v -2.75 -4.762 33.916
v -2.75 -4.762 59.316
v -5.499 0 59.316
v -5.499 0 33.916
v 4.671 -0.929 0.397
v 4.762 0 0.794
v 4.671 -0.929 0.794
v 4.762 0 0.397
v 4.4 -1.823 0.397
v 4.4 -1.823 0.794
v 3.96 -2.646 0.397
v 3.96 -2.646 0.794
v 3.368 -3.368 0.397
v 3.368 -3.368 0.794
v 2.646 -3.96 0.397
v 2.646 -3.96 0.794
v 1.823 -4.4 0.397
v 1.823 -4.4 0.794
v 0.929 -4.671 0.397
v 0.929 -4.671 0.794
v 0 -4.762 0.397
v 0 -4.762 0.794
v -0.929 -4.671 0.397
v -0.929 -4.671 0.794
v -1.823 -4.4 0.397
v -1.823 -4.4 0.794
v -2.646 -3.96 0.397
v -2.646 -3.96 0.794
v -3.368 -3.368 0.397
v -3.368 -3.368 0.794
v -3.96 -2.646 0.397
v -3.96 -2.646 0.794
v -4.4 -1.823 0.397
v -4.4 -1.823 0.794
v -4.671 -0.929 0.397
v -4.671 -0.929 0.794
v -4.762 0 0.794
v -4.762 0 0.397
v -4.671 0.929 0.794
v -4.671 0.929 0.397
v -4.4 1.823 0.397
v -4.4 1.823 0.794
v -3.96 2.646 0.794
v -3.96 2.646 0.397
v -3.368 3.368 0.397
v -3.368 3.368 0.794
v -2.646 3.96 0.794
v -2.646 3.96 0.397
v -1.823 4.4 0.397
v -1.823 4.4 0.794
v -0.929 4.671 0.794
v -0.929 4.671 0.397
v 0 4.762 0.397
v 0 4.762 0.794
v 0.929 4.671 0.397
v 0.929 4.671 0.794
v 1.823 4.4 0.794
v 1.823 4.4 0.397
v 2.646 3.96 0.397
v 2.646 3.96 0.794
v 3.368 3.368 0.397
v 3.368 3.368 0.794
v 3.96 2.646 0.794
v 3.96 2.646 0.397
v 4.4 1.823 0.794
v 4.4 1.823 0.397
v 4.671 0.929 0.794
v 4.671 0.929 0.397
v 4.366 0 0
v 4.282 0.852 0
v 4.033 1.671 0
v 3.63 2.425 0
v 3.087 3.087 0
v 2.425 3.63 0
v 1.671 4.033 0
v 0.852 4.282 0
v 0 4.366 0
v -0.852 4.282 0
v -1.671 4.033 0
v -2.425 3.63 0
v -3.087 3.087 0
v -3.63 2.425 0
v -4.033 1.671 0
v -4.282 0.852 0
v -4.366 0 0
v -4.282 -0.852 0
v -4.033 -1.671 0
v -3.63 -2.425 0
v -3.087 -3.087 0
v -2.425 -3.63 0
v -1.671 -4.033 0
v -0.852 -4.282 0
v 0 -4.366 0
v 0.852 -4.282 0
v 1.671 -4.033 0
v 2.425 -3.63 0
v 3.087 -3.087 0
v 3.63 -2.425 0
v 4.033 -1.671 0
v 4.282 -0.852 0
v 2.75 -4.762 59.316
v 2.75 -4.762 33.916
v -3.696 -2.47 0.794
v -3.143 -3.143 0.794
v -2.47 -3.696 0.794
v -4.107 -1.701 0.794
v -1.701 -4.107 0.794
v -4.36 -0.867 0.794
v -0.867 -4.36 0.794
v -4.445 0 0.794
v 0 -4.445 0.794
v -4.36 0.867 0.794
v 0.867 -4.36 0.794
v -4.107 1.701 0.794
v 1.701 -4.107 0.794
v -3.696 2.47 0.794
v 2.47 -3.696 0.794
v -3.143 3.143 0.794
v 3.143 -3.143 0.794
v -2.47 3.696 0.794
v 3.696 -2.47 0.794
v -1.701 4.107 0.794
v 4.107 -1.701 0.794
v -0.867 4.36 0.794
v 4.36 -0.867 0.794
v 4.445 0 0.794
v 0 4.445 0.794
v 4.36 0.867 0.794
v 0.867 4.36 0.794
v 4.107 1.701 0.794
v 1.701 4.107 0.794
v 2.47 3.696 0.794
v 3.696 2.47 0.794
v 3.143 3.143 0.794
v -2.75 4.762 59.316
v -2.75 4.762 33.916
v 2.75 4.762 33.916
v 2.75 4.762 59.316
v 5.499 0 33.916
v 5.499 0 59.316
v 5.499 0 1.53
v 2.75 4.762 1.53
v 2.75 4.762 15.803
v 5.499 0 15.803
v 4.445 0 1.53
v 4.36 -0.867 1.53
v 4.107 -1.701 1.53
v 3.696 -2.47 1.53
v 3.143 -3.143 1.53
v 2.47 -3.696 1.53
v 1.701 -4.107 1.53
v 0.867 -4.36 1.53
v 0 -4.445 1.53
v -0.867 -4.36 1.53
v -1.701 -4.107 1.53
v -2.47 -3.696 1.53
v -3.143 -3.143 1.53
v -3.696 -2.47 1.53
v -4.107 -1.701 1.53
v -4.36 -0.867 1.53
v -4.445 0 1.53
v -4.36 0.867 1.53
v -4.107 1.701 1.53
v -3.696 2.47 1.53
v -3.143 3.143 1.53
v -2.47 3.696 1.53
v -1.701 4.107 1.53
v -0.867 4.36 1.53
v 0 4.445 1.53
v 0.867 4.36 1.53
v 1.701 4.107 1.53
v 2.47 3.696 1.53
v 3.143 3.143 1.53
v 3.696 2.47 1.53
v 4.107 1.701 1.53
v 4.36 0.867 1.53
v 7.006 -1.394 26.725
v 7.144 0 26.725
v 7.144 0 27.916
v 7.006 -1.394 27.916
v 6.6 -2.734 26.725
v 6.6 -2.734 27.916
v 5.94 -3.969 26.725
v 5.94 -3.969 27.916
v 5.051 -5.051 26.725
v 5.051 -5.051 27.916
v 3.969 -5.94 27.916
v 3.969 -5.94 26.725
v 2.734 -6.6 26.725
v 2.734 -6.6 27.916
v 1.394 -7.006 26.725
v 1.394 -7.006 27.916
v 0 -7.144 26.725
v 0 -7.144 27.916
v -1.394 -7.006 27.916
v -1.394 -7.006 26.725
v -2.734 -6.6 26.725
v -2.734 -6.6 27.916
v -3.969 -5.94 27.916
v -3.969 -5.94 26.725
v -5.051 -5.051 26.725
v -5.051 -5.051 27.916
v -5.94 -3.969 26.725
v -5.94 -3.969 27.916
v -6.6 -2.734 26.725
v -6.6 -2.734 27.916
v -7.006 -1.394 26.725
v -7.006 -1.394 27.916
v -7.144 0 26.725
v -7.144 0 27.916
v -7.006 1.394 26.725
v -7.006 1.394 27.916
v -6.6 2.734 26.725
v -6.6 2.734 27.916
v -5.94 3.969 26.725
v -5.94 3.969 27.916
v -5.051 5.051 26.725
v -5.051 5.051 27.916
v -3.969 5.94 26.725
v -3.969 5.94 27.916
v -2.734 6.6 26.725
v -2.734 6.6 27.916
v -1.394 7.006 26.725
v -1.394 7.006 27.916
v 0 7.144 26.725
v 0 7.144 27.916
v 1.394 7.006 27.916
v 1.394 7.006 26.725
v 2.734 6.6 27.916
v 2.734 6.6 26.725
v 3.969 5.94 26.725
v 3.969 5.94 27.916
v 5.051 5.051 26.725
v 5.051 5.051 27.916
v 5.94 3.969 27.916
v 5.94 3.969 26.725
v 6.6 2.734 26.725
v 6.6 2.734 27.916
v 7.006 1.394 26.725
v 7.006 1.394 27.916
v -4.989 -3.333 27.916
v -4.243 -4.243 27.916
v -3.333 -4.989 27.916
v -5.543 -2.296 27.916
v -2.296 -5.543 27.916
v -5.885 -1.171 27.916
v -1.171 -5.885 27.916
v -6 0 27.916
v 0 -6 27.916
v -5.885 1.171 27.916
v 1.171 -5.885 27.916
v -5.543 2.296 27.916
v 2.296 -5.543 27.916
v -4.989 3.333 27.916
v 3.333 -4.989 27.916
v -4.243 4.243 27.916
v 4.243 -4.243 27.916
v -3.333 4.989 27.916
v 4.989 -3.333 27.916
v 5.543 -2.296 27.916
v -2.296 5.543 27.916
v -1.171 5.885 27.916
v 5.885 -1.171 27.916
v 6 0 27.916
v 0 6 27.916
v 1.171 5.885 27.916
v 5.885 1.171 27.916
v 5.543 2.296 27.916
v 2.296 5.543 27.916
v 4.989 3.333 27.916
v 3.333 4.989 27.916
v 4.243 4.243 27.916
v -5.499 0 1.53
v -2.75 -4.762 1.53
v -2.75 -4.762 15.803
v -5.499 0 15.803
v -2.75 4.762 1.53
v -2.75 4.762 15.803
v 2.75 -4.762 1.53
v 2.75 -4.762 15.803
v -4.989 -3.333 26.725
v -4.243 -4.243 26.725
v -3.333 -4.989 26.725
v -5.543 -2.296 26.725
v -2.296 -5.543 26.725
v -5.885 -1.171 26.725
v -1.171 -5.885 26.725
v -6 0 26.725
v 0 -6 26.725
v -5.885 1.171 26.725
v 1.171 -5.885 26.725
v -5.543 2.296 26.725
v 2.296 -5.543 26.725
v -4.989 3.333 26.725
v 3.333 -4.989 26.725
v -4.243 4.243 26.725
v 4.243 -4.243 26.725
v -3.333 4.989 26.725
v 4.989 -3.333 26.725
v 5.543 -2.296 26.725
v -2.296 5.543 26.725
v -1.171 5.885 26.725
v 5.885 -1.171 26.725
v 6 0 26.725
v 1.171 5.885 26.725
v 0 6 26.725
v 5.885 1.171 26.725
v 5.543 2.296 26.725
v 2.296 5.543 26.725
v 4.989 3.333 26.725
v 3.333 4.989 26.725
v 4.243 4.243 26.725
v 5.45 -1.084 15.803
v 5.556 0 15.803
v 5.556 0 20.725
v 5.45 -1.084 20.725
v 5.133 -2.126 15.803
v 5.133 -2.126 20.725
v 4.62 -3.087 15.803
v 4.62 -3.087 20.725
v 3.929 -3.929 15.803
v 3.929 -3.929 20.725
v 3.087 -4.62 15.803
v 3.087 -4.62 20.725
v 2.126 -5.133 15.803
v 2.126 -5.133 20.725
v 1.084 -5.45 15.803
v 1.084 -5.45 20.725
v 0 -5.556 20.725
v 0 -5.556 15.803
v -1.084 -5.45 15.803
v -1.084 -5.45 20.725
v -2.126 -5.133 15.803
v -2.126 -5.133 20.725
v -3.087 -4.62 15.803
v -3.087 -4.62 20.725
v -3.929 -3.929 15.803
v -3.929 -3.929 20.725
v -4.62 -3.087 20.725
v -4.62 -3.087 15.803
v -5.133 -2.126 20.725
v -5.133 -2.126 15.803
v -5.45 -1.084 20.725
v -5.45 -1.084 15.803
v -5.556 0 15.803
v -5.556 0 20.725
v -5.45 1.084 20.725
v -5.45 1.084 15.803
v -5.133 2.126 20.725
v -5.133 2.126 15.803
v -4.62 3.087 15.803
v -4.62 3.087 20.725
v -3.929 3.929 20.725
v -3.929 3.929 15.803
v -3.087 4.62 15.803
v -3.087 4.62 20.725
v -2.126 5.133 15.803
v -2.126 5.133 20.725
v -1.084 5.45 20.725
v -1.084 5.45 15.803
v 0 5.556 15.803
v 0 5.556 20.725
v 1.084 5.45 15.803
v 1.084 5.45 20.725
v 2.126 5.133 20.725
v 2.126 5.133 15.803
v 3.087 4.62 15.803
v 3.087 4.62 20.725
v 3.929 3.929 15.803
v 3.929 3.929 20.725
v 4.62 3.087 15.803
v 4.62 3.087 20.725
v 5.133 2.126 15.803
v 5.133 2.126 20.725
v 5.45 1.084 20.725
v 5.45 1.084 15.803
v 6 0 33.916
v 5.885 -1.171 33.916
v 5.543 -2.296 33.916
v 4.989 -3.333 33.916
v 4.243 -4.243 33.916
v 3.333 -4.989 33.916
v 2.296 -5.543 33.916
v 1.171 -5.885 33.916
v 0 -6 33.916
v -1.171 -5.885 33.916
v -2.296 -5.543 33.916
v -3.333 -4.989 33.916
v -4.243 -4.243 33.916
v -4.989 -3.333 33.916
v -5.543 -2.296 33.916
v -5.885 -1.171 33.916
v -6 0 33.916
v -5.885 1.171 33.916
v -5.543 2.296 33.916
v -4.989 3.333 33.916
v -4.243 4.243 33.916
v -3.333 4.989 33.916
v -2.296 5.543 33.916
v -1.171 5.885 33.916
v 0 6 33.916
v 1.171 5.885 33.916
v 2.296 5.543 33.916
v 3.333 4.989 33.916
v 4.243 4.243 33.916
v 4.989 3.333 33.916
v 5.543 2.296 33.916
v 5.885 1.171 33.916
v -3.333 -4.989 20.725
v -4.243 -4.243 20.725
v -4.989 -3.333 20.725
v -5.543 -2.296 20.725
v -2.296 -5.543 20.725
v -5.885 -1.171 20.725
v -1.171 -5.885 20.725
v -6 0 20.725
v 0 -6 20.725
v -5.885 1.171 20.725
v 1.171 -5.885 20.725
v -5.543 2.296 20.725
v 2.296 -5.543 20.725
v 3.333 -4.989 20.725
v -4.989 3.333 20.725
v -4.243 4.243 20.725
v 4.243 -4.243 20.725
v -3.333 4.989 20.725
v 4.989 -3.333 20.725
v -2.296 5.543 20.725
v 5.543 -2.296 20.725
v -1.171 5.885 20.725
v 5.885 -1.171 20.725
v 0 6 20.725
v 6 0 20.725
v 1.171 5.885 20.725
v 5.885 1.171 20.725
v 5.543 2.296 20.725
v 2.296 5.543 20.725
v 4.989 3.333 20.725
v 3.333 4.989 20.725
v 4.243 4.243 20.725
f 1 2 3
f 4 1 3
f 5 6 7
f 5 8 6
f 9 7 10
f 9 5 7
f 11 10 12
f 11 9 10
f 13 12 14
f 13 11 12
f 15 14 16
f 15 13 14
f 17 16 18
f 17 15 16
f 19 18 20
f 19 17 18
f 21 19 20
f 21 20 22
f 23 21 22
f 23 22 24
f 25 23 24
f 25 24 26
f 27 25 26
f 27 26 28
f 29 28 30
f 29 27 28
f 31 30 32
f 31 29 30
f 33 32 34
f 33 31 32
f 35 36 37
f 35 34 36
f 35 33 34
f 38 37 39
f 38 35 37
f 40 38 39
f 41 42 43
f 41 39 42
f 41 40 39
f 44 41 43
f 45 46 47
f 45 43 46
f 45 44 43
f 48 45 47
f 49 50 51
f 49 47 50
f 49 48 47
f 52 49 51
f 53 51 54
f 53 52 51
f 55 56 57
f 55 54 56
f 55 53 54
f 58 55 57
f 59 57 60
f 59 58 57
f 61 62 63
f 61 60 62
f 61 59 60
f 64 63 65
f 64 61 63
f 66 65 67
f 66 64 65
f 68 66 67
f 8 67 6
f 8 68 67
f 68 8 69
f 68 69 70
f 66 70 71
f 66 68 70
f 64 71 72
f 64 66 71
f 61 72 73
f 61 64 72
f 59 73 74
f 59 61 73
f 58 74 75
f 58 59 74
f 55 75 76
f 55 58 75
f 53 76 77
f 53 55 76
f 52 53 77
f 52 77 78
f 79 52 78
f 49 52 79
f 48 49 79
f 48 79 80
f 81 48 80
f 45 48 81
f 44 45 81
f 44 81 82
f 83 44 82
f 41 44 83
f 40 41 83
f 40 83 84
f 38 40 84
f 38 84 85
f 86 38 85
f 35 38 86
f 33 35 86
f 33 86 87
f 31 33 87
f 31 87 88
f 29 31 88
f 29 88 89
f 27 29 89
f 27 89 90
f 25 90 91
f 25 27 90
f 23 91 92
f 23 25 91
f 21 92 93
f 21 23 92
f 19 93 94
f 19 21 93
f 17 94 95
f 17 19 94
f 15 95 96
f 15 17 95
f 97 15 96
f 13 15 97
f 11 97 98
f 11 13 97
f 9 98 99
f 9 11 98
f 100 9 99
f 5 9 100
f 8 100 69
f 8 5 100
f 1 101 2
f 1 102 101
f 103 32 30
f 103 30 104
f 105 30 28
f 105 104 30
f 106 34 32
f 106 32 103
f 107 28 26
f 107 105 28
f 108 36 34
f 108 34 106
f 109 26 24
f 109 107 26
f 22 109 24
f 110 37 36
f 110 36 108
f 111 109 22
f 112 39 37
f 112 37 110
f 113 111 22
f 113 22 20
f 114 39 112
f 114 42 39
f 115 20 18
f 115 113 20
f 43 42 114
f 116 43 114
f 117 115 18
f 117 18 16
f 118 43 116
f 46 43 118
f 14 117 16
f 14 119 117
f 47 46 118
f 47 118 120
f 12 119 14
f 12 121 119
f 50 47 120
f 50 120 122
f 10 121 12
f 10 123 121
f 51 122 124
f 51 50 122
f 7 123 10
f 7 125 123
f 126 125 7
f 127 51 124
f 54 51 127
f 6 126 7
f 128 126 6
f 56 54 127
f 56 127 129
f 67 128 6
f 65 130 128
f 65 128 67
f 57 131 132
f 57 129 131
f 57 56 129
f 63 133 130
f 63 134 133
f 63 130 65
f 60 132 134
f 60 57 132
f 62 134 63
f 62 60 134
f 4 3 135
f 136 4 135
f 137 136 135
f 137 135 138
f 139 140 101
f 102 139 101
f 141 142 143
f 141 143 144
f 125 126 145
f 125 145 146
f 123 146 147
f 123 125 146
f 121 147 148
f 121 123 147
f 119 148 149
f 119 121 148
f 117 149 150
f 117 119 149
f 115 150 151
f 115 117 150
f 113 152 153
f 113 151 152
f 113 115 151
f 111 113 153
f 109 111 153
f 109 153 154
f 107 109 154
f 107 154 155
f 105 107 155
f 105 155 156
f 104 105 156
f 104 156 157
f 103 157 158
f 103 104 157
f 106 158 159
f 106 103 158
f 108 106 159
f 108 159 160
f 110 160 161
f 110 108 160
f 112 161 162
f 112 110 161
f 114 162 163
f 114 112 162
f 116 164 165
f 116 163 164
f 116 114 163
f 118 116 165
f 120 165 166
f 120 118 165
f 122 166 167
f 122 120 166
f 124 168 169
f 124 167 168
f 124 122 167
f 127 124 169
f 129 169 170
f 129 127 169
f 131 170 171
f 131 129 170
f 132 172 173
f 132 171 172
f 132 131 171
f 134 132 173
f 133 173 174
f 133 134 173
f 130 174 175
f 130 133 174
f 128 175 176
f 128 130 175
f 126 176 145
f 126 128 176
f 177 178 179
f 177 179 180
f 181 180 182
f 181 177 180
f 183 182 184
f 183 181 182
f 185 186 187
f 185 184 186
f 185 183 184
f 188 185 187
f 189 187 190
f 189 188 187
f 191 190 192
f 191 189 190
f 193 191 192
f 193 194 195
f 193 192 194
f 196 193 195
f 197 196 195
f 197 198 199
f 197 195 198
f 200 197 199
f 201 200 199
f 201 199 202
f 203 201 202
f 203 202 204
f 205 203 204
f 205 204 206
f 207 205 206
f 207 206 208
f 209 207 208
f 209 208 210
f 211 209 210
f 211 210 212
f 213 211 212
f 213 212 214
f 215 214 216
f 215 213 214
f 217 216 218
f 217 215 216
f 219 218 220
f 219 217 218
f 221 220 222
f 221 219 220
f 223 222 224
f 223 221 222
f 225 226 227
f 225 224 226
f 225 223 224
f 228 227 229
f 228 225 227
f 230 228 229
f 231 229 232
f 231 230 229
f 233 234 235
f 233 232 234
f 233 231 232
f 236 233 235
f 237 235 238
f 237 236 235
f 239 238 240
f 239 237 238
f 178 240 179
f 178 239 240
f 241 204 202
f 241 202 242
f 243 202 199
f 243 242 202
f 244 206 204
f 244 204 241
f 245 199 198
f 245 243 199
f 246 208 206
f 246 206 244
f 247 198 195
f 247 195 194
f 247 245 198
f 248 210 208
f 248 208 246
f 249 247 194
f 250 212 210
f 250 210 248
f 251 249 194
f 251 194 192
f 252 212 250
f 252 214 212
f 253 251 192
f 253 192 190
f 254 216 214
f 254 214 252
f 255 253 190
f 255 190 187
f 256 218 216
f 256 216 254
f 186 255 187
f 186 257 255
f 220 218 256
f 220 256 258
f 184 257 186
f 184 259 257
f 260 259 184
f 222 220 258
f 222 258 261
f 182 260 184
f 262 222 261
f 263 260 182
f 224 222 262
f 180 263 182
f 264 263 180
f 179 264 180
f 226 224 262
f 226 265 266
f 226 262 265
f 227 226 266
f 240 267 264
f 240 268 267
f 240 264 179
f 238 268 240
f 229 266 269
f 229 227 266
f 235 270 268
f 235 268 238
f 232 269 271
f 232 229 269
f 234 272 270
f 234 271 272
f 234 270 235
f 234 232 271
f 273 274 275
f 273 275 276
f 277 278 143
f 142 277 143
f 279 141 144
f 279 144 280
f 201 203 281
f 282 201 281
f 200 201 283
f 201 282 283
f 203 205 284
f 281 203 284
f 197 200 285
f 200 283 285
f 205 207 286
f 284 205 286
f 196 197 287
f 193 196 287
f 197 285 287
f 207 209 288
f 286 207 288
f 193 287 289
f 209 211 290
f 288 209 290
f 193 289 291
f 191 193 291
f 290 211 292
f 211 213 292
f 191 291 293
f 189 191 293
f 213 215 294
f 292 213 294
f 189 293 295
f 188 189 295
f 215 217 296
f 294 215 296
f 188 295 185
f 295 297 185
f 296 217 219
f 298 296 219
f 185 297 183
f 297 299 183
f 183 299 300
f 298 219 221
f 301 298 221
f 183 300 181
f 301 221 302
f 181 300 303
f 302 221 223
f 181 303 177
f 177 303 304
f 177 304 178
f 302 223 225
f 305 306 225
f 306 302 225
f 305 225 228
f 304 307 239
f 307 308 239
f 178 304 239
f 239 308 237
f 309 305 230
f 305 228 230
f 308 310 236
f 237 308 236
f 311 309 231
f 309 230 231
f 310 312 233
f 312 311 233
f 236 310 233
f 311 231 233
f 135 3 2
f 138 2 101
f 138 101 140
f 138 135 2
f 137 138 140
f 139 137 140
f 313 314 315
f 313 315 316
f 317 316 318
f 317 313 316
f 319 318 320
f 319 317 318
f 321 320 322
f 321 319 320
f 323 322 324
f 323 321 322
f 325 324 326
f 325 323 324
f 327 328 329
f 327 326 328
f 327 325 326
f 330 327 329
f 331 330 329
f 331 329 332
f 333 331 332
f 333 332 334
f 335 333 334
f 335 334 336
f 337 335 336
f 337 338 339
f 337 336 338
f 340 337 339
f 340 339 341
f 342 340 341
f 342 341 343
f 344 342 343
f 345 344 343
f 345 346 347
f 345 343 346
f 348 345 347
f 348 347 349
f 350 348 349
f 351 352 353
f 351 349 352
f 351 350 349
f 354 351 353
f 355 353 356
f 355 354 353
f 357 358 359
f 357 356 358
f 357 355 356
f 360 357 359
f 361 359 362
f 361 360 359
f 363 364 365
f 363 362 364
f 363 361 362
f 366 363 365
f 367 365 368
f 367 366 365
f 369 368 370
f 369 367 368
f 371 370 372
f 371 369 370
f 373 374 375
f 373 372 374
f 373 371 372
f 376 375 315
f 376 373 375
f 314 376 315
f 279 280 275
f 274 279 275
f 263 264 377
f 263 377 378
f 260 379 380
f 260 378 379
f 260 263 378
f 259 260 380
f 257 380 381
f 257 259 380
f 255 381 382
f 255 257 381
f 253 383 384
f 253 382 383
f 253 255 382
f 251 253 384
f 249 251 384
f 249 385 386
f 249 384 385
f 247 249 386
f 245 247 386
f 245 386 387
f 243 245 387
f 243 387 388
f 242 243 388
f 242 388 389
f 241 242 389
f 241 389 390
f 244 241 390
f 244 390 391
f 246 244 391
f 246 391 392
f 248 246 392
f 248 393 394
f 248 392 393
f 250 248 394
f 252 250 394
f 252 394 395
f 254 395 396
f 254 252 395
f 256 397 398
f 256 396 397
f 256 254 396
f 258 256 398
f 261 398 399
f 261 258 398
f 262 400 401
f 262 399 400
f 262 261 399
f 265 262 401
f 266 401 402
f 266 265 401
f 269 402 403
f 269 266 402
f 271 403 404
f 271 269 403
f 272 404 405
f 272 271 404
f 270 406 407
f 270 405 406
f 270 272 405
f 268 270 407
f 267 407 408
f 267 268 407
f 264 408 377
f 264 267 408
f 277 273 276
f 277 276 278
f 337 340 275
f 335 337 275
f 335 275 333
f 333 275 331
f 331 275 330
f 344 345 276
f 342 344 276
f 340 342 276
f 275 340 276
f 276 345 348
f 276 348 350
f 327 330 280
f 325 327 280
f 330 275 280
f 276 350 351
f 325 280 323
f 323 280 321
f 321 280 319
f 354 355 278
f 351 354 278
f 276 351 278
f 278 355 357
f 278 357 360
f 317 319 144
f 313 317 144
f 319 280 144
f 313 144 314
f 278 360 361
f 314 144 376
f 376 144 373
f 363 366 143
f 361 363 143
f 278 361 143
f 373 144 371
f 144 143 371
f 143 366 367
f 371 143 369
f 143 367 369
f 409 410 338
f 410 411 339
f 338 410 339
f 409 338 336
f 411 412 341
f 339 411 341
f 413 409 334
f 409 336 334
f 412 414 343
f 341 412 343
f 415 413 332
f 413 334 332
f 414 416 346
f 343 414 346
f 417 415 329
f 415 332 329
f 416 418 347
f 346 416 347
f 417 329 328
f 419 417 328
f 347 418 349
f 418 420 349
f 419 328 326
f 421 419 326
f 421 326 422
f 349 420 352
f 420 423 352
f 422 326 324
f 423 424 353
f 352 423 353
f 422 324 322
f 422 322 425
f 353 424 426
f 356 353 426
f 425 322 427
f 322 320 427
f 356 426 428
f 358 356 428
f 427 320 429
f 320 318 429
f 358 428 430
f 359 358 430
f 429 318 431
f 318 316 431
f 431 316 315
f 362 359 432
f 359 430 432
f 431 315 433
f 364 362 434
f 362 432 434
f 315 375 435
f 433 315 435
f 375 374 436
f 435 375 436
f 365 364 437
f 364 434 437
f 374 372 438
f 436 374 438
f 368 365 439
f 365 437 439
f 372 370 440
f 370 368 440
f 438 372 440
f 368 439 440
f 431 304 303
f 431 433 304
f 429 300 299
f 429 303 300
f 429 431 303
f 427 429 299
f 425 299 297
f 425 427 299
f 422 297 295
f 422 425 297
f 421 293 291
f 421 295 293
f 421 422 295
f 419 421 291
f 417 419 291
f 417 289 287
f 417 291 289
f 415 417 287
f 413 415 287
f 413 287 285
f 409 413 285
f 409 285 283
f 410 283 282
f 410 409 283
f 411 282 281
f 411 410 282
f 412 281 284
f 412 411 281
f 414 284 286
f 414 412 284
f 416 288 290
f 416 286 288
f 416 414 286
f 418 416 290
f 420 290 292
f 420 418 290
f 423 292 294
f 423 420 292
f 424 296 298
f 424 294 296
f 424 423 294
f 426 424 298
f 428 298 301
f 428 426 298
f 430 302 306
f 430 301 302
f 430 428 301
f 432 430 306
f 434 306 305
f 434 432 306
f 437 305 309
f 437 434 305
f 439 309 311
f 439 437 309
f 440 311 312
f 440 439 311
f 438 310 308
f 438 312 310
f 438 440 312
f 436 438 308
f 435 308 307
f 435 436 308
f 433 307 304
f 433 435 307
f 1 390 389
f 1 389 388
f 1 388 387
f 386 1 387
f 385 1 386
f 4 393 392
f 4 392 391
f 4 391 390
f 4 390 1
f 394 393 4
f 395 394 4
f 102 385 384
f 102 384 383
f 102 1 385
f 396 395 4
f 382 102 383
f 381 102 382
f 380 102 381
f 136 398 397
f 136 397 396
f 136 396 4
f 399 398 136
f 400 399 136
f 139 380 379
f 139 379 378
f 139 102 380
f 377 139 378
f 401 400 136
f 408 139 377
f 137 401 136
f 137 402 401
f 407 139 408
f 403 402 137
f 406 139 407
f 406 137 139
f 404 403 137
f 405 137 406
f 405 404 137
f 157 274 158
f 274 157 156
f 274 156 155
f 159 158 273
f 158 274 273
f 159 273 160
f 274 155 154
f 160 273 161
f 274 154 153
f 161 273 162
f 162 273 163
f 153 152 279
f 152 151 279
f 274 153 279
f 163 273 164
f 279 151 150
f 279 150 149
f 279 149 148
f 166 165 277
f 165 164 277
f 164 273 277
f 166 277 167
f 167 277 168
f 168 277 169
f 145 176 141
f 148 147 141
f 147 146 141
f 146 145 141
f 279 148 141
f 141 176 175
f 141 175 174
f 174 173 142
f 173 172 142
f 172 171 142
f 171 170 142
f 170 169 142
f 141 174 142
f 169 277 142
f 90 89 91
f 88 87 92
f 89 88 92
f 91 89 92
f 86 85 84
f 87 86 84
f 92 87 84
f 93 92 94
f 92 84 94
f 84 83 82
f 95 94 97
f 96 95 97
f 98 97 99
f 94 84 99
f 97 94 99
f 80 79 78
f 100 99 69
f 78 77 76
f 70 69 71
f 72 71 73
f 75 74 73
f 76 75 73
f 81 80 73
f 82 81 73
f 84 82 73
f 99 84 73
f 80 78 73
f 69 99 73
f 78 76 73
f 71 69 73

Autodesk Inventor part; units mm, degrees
ref_plane "YZ Plane" through (0, 0, 0) normal (1, 0, 0) x (0, 1, 0)
ref_plane "XZ Plane" through (0, 0, 0) normal (0, 1, 0) x (-1, 0, 0)
ref_plane "XY Plane" through (0, 0, 0) normal (0, 0, 1) x (1, 0, 0)
sketch "Sketch1" plane through (0, 0, 0) normal (0, 0, 1) x (1, 0, 0)
  circle A0 centre (0, 0) radius 4.7625
  dimension "d0" = 9.525
extrude "Extrusion1" add sketch "Sketch1" along normal blind 0.7937
sketch "Sketch2" plane through (0, 0, 0.7937) normal (0, 0, 1) x (1, 0, 0)
  circle A0 centre (0, 0) radius 4.7625 projected
  circle A1 centre (0, 0) radius 4.445
  dimension "d3" = 8.89
extrude "Extrusion2" add sketch "Sketch2" along normal blind 0.7366 contours A1
sketch "Sketch3" plane through (0, 0, 1.5304) normal (0, 0, 1) x (1, 0, 0)
  circle A0 centre (0, 0) radius 4.445 projected
  line L0 (5.4993, 0) -> (2.7496, -4.7625)
  line L1 (2.7496, -4.7625) -> (-2.7496, -4.7625)
  line L2 (-2.7496, -4.7625) -> (-5.4993, 0)
  line L3 (-5.4993, 0) -> (-2.7496, 4.7625)
  line L4 (-2.7496, 4.7625) -> (2.7496, 4.7625)
  line L5 (2.7496, 4.7625) -> (5.4993, 0)
  dimension "d6" = 9.525
extrude "Extrusion3" add sketch "Sketch3" along normal blind 14.273 contours A0 | L0 L1 L2 L3 L4 L5
sketch "Sketch4" plane through (0, 0, 15.8034) normal (0, 0, 1) x (1, 0, 0)
  circle A0 centre (0, 0) radius 5.5563
  dimension "d9" = 11.1125
extrude "Extrusion4" add sketch "Sketch4" along normal blind 4.9219
sketch "Sketch8" plane through (0, 0, 20.7252) normal (0, 0, 1) x (1, 0, 0)
  circle A0 centre (0, 0) radius 5.5562 projected
  circle A1 centre (0, 0) radius 6
  dimension "d24" = 12
extrude "Extrusion8" add sketch "Sketch8" along normal blind 6 contours A0 | A1
sketch "Sketch5" plane through (0, 0, 26.7252) normal (0, 0, 1) x (1, 0, 0)
  circle A0 centre (0, 0) radius 7.1437
  dimension "d12" = 14.2875
extrude "Extrusion5" add sketch "Sketch5" along normal blind 1.1906
sketch "Sketch6" plane through (0, 0, 27.9159) normal (0, 0, 1) x (1, 0, 0)
  circle A0 centre (0, 0) radius 7.1437 projected
  circle A1 centre (0, 0) radius 6
  dimension "d15" = 12
extrude "Extrusion6" add sketch "Sketch6" along normal blind 6 contours A1
sketch "Sketch7" plane through (0, 0, 33.9159) normal (0, 0, 1) x (1, 0, 0)
  circle A0 centre (0, 0) radius 6 projected
  line L0 (2.7496, 4.7625) -> (5.4993, 0)
  line L1 (5.4993, 0) -> (2.7496, -4.7625)
  line L2 (2.7496, -4.7625) -> (-2.7496, -4.7625)
  line L3 (-2.7496, -4.7625) -> (-5.4993, 0)
  line L4 (-5.4993, 0) -> (-2.7496, 4.7625)
  line L5 (-2.7496, 4.7625) -> (2.7496, 4.7625)
  dimension "d18" = 9.525
extrude "Extrusion7" add sketch "Sketch7" along normal blind 25.4 contours L0 L1 L2 L3 L4 L5
chamfer "Chamfer1" distance 0.3969 angle 45 1 edges at (-4.7625, 0, 0)
properties part number "Module Top Shaft" material "Aluminum 6061"
